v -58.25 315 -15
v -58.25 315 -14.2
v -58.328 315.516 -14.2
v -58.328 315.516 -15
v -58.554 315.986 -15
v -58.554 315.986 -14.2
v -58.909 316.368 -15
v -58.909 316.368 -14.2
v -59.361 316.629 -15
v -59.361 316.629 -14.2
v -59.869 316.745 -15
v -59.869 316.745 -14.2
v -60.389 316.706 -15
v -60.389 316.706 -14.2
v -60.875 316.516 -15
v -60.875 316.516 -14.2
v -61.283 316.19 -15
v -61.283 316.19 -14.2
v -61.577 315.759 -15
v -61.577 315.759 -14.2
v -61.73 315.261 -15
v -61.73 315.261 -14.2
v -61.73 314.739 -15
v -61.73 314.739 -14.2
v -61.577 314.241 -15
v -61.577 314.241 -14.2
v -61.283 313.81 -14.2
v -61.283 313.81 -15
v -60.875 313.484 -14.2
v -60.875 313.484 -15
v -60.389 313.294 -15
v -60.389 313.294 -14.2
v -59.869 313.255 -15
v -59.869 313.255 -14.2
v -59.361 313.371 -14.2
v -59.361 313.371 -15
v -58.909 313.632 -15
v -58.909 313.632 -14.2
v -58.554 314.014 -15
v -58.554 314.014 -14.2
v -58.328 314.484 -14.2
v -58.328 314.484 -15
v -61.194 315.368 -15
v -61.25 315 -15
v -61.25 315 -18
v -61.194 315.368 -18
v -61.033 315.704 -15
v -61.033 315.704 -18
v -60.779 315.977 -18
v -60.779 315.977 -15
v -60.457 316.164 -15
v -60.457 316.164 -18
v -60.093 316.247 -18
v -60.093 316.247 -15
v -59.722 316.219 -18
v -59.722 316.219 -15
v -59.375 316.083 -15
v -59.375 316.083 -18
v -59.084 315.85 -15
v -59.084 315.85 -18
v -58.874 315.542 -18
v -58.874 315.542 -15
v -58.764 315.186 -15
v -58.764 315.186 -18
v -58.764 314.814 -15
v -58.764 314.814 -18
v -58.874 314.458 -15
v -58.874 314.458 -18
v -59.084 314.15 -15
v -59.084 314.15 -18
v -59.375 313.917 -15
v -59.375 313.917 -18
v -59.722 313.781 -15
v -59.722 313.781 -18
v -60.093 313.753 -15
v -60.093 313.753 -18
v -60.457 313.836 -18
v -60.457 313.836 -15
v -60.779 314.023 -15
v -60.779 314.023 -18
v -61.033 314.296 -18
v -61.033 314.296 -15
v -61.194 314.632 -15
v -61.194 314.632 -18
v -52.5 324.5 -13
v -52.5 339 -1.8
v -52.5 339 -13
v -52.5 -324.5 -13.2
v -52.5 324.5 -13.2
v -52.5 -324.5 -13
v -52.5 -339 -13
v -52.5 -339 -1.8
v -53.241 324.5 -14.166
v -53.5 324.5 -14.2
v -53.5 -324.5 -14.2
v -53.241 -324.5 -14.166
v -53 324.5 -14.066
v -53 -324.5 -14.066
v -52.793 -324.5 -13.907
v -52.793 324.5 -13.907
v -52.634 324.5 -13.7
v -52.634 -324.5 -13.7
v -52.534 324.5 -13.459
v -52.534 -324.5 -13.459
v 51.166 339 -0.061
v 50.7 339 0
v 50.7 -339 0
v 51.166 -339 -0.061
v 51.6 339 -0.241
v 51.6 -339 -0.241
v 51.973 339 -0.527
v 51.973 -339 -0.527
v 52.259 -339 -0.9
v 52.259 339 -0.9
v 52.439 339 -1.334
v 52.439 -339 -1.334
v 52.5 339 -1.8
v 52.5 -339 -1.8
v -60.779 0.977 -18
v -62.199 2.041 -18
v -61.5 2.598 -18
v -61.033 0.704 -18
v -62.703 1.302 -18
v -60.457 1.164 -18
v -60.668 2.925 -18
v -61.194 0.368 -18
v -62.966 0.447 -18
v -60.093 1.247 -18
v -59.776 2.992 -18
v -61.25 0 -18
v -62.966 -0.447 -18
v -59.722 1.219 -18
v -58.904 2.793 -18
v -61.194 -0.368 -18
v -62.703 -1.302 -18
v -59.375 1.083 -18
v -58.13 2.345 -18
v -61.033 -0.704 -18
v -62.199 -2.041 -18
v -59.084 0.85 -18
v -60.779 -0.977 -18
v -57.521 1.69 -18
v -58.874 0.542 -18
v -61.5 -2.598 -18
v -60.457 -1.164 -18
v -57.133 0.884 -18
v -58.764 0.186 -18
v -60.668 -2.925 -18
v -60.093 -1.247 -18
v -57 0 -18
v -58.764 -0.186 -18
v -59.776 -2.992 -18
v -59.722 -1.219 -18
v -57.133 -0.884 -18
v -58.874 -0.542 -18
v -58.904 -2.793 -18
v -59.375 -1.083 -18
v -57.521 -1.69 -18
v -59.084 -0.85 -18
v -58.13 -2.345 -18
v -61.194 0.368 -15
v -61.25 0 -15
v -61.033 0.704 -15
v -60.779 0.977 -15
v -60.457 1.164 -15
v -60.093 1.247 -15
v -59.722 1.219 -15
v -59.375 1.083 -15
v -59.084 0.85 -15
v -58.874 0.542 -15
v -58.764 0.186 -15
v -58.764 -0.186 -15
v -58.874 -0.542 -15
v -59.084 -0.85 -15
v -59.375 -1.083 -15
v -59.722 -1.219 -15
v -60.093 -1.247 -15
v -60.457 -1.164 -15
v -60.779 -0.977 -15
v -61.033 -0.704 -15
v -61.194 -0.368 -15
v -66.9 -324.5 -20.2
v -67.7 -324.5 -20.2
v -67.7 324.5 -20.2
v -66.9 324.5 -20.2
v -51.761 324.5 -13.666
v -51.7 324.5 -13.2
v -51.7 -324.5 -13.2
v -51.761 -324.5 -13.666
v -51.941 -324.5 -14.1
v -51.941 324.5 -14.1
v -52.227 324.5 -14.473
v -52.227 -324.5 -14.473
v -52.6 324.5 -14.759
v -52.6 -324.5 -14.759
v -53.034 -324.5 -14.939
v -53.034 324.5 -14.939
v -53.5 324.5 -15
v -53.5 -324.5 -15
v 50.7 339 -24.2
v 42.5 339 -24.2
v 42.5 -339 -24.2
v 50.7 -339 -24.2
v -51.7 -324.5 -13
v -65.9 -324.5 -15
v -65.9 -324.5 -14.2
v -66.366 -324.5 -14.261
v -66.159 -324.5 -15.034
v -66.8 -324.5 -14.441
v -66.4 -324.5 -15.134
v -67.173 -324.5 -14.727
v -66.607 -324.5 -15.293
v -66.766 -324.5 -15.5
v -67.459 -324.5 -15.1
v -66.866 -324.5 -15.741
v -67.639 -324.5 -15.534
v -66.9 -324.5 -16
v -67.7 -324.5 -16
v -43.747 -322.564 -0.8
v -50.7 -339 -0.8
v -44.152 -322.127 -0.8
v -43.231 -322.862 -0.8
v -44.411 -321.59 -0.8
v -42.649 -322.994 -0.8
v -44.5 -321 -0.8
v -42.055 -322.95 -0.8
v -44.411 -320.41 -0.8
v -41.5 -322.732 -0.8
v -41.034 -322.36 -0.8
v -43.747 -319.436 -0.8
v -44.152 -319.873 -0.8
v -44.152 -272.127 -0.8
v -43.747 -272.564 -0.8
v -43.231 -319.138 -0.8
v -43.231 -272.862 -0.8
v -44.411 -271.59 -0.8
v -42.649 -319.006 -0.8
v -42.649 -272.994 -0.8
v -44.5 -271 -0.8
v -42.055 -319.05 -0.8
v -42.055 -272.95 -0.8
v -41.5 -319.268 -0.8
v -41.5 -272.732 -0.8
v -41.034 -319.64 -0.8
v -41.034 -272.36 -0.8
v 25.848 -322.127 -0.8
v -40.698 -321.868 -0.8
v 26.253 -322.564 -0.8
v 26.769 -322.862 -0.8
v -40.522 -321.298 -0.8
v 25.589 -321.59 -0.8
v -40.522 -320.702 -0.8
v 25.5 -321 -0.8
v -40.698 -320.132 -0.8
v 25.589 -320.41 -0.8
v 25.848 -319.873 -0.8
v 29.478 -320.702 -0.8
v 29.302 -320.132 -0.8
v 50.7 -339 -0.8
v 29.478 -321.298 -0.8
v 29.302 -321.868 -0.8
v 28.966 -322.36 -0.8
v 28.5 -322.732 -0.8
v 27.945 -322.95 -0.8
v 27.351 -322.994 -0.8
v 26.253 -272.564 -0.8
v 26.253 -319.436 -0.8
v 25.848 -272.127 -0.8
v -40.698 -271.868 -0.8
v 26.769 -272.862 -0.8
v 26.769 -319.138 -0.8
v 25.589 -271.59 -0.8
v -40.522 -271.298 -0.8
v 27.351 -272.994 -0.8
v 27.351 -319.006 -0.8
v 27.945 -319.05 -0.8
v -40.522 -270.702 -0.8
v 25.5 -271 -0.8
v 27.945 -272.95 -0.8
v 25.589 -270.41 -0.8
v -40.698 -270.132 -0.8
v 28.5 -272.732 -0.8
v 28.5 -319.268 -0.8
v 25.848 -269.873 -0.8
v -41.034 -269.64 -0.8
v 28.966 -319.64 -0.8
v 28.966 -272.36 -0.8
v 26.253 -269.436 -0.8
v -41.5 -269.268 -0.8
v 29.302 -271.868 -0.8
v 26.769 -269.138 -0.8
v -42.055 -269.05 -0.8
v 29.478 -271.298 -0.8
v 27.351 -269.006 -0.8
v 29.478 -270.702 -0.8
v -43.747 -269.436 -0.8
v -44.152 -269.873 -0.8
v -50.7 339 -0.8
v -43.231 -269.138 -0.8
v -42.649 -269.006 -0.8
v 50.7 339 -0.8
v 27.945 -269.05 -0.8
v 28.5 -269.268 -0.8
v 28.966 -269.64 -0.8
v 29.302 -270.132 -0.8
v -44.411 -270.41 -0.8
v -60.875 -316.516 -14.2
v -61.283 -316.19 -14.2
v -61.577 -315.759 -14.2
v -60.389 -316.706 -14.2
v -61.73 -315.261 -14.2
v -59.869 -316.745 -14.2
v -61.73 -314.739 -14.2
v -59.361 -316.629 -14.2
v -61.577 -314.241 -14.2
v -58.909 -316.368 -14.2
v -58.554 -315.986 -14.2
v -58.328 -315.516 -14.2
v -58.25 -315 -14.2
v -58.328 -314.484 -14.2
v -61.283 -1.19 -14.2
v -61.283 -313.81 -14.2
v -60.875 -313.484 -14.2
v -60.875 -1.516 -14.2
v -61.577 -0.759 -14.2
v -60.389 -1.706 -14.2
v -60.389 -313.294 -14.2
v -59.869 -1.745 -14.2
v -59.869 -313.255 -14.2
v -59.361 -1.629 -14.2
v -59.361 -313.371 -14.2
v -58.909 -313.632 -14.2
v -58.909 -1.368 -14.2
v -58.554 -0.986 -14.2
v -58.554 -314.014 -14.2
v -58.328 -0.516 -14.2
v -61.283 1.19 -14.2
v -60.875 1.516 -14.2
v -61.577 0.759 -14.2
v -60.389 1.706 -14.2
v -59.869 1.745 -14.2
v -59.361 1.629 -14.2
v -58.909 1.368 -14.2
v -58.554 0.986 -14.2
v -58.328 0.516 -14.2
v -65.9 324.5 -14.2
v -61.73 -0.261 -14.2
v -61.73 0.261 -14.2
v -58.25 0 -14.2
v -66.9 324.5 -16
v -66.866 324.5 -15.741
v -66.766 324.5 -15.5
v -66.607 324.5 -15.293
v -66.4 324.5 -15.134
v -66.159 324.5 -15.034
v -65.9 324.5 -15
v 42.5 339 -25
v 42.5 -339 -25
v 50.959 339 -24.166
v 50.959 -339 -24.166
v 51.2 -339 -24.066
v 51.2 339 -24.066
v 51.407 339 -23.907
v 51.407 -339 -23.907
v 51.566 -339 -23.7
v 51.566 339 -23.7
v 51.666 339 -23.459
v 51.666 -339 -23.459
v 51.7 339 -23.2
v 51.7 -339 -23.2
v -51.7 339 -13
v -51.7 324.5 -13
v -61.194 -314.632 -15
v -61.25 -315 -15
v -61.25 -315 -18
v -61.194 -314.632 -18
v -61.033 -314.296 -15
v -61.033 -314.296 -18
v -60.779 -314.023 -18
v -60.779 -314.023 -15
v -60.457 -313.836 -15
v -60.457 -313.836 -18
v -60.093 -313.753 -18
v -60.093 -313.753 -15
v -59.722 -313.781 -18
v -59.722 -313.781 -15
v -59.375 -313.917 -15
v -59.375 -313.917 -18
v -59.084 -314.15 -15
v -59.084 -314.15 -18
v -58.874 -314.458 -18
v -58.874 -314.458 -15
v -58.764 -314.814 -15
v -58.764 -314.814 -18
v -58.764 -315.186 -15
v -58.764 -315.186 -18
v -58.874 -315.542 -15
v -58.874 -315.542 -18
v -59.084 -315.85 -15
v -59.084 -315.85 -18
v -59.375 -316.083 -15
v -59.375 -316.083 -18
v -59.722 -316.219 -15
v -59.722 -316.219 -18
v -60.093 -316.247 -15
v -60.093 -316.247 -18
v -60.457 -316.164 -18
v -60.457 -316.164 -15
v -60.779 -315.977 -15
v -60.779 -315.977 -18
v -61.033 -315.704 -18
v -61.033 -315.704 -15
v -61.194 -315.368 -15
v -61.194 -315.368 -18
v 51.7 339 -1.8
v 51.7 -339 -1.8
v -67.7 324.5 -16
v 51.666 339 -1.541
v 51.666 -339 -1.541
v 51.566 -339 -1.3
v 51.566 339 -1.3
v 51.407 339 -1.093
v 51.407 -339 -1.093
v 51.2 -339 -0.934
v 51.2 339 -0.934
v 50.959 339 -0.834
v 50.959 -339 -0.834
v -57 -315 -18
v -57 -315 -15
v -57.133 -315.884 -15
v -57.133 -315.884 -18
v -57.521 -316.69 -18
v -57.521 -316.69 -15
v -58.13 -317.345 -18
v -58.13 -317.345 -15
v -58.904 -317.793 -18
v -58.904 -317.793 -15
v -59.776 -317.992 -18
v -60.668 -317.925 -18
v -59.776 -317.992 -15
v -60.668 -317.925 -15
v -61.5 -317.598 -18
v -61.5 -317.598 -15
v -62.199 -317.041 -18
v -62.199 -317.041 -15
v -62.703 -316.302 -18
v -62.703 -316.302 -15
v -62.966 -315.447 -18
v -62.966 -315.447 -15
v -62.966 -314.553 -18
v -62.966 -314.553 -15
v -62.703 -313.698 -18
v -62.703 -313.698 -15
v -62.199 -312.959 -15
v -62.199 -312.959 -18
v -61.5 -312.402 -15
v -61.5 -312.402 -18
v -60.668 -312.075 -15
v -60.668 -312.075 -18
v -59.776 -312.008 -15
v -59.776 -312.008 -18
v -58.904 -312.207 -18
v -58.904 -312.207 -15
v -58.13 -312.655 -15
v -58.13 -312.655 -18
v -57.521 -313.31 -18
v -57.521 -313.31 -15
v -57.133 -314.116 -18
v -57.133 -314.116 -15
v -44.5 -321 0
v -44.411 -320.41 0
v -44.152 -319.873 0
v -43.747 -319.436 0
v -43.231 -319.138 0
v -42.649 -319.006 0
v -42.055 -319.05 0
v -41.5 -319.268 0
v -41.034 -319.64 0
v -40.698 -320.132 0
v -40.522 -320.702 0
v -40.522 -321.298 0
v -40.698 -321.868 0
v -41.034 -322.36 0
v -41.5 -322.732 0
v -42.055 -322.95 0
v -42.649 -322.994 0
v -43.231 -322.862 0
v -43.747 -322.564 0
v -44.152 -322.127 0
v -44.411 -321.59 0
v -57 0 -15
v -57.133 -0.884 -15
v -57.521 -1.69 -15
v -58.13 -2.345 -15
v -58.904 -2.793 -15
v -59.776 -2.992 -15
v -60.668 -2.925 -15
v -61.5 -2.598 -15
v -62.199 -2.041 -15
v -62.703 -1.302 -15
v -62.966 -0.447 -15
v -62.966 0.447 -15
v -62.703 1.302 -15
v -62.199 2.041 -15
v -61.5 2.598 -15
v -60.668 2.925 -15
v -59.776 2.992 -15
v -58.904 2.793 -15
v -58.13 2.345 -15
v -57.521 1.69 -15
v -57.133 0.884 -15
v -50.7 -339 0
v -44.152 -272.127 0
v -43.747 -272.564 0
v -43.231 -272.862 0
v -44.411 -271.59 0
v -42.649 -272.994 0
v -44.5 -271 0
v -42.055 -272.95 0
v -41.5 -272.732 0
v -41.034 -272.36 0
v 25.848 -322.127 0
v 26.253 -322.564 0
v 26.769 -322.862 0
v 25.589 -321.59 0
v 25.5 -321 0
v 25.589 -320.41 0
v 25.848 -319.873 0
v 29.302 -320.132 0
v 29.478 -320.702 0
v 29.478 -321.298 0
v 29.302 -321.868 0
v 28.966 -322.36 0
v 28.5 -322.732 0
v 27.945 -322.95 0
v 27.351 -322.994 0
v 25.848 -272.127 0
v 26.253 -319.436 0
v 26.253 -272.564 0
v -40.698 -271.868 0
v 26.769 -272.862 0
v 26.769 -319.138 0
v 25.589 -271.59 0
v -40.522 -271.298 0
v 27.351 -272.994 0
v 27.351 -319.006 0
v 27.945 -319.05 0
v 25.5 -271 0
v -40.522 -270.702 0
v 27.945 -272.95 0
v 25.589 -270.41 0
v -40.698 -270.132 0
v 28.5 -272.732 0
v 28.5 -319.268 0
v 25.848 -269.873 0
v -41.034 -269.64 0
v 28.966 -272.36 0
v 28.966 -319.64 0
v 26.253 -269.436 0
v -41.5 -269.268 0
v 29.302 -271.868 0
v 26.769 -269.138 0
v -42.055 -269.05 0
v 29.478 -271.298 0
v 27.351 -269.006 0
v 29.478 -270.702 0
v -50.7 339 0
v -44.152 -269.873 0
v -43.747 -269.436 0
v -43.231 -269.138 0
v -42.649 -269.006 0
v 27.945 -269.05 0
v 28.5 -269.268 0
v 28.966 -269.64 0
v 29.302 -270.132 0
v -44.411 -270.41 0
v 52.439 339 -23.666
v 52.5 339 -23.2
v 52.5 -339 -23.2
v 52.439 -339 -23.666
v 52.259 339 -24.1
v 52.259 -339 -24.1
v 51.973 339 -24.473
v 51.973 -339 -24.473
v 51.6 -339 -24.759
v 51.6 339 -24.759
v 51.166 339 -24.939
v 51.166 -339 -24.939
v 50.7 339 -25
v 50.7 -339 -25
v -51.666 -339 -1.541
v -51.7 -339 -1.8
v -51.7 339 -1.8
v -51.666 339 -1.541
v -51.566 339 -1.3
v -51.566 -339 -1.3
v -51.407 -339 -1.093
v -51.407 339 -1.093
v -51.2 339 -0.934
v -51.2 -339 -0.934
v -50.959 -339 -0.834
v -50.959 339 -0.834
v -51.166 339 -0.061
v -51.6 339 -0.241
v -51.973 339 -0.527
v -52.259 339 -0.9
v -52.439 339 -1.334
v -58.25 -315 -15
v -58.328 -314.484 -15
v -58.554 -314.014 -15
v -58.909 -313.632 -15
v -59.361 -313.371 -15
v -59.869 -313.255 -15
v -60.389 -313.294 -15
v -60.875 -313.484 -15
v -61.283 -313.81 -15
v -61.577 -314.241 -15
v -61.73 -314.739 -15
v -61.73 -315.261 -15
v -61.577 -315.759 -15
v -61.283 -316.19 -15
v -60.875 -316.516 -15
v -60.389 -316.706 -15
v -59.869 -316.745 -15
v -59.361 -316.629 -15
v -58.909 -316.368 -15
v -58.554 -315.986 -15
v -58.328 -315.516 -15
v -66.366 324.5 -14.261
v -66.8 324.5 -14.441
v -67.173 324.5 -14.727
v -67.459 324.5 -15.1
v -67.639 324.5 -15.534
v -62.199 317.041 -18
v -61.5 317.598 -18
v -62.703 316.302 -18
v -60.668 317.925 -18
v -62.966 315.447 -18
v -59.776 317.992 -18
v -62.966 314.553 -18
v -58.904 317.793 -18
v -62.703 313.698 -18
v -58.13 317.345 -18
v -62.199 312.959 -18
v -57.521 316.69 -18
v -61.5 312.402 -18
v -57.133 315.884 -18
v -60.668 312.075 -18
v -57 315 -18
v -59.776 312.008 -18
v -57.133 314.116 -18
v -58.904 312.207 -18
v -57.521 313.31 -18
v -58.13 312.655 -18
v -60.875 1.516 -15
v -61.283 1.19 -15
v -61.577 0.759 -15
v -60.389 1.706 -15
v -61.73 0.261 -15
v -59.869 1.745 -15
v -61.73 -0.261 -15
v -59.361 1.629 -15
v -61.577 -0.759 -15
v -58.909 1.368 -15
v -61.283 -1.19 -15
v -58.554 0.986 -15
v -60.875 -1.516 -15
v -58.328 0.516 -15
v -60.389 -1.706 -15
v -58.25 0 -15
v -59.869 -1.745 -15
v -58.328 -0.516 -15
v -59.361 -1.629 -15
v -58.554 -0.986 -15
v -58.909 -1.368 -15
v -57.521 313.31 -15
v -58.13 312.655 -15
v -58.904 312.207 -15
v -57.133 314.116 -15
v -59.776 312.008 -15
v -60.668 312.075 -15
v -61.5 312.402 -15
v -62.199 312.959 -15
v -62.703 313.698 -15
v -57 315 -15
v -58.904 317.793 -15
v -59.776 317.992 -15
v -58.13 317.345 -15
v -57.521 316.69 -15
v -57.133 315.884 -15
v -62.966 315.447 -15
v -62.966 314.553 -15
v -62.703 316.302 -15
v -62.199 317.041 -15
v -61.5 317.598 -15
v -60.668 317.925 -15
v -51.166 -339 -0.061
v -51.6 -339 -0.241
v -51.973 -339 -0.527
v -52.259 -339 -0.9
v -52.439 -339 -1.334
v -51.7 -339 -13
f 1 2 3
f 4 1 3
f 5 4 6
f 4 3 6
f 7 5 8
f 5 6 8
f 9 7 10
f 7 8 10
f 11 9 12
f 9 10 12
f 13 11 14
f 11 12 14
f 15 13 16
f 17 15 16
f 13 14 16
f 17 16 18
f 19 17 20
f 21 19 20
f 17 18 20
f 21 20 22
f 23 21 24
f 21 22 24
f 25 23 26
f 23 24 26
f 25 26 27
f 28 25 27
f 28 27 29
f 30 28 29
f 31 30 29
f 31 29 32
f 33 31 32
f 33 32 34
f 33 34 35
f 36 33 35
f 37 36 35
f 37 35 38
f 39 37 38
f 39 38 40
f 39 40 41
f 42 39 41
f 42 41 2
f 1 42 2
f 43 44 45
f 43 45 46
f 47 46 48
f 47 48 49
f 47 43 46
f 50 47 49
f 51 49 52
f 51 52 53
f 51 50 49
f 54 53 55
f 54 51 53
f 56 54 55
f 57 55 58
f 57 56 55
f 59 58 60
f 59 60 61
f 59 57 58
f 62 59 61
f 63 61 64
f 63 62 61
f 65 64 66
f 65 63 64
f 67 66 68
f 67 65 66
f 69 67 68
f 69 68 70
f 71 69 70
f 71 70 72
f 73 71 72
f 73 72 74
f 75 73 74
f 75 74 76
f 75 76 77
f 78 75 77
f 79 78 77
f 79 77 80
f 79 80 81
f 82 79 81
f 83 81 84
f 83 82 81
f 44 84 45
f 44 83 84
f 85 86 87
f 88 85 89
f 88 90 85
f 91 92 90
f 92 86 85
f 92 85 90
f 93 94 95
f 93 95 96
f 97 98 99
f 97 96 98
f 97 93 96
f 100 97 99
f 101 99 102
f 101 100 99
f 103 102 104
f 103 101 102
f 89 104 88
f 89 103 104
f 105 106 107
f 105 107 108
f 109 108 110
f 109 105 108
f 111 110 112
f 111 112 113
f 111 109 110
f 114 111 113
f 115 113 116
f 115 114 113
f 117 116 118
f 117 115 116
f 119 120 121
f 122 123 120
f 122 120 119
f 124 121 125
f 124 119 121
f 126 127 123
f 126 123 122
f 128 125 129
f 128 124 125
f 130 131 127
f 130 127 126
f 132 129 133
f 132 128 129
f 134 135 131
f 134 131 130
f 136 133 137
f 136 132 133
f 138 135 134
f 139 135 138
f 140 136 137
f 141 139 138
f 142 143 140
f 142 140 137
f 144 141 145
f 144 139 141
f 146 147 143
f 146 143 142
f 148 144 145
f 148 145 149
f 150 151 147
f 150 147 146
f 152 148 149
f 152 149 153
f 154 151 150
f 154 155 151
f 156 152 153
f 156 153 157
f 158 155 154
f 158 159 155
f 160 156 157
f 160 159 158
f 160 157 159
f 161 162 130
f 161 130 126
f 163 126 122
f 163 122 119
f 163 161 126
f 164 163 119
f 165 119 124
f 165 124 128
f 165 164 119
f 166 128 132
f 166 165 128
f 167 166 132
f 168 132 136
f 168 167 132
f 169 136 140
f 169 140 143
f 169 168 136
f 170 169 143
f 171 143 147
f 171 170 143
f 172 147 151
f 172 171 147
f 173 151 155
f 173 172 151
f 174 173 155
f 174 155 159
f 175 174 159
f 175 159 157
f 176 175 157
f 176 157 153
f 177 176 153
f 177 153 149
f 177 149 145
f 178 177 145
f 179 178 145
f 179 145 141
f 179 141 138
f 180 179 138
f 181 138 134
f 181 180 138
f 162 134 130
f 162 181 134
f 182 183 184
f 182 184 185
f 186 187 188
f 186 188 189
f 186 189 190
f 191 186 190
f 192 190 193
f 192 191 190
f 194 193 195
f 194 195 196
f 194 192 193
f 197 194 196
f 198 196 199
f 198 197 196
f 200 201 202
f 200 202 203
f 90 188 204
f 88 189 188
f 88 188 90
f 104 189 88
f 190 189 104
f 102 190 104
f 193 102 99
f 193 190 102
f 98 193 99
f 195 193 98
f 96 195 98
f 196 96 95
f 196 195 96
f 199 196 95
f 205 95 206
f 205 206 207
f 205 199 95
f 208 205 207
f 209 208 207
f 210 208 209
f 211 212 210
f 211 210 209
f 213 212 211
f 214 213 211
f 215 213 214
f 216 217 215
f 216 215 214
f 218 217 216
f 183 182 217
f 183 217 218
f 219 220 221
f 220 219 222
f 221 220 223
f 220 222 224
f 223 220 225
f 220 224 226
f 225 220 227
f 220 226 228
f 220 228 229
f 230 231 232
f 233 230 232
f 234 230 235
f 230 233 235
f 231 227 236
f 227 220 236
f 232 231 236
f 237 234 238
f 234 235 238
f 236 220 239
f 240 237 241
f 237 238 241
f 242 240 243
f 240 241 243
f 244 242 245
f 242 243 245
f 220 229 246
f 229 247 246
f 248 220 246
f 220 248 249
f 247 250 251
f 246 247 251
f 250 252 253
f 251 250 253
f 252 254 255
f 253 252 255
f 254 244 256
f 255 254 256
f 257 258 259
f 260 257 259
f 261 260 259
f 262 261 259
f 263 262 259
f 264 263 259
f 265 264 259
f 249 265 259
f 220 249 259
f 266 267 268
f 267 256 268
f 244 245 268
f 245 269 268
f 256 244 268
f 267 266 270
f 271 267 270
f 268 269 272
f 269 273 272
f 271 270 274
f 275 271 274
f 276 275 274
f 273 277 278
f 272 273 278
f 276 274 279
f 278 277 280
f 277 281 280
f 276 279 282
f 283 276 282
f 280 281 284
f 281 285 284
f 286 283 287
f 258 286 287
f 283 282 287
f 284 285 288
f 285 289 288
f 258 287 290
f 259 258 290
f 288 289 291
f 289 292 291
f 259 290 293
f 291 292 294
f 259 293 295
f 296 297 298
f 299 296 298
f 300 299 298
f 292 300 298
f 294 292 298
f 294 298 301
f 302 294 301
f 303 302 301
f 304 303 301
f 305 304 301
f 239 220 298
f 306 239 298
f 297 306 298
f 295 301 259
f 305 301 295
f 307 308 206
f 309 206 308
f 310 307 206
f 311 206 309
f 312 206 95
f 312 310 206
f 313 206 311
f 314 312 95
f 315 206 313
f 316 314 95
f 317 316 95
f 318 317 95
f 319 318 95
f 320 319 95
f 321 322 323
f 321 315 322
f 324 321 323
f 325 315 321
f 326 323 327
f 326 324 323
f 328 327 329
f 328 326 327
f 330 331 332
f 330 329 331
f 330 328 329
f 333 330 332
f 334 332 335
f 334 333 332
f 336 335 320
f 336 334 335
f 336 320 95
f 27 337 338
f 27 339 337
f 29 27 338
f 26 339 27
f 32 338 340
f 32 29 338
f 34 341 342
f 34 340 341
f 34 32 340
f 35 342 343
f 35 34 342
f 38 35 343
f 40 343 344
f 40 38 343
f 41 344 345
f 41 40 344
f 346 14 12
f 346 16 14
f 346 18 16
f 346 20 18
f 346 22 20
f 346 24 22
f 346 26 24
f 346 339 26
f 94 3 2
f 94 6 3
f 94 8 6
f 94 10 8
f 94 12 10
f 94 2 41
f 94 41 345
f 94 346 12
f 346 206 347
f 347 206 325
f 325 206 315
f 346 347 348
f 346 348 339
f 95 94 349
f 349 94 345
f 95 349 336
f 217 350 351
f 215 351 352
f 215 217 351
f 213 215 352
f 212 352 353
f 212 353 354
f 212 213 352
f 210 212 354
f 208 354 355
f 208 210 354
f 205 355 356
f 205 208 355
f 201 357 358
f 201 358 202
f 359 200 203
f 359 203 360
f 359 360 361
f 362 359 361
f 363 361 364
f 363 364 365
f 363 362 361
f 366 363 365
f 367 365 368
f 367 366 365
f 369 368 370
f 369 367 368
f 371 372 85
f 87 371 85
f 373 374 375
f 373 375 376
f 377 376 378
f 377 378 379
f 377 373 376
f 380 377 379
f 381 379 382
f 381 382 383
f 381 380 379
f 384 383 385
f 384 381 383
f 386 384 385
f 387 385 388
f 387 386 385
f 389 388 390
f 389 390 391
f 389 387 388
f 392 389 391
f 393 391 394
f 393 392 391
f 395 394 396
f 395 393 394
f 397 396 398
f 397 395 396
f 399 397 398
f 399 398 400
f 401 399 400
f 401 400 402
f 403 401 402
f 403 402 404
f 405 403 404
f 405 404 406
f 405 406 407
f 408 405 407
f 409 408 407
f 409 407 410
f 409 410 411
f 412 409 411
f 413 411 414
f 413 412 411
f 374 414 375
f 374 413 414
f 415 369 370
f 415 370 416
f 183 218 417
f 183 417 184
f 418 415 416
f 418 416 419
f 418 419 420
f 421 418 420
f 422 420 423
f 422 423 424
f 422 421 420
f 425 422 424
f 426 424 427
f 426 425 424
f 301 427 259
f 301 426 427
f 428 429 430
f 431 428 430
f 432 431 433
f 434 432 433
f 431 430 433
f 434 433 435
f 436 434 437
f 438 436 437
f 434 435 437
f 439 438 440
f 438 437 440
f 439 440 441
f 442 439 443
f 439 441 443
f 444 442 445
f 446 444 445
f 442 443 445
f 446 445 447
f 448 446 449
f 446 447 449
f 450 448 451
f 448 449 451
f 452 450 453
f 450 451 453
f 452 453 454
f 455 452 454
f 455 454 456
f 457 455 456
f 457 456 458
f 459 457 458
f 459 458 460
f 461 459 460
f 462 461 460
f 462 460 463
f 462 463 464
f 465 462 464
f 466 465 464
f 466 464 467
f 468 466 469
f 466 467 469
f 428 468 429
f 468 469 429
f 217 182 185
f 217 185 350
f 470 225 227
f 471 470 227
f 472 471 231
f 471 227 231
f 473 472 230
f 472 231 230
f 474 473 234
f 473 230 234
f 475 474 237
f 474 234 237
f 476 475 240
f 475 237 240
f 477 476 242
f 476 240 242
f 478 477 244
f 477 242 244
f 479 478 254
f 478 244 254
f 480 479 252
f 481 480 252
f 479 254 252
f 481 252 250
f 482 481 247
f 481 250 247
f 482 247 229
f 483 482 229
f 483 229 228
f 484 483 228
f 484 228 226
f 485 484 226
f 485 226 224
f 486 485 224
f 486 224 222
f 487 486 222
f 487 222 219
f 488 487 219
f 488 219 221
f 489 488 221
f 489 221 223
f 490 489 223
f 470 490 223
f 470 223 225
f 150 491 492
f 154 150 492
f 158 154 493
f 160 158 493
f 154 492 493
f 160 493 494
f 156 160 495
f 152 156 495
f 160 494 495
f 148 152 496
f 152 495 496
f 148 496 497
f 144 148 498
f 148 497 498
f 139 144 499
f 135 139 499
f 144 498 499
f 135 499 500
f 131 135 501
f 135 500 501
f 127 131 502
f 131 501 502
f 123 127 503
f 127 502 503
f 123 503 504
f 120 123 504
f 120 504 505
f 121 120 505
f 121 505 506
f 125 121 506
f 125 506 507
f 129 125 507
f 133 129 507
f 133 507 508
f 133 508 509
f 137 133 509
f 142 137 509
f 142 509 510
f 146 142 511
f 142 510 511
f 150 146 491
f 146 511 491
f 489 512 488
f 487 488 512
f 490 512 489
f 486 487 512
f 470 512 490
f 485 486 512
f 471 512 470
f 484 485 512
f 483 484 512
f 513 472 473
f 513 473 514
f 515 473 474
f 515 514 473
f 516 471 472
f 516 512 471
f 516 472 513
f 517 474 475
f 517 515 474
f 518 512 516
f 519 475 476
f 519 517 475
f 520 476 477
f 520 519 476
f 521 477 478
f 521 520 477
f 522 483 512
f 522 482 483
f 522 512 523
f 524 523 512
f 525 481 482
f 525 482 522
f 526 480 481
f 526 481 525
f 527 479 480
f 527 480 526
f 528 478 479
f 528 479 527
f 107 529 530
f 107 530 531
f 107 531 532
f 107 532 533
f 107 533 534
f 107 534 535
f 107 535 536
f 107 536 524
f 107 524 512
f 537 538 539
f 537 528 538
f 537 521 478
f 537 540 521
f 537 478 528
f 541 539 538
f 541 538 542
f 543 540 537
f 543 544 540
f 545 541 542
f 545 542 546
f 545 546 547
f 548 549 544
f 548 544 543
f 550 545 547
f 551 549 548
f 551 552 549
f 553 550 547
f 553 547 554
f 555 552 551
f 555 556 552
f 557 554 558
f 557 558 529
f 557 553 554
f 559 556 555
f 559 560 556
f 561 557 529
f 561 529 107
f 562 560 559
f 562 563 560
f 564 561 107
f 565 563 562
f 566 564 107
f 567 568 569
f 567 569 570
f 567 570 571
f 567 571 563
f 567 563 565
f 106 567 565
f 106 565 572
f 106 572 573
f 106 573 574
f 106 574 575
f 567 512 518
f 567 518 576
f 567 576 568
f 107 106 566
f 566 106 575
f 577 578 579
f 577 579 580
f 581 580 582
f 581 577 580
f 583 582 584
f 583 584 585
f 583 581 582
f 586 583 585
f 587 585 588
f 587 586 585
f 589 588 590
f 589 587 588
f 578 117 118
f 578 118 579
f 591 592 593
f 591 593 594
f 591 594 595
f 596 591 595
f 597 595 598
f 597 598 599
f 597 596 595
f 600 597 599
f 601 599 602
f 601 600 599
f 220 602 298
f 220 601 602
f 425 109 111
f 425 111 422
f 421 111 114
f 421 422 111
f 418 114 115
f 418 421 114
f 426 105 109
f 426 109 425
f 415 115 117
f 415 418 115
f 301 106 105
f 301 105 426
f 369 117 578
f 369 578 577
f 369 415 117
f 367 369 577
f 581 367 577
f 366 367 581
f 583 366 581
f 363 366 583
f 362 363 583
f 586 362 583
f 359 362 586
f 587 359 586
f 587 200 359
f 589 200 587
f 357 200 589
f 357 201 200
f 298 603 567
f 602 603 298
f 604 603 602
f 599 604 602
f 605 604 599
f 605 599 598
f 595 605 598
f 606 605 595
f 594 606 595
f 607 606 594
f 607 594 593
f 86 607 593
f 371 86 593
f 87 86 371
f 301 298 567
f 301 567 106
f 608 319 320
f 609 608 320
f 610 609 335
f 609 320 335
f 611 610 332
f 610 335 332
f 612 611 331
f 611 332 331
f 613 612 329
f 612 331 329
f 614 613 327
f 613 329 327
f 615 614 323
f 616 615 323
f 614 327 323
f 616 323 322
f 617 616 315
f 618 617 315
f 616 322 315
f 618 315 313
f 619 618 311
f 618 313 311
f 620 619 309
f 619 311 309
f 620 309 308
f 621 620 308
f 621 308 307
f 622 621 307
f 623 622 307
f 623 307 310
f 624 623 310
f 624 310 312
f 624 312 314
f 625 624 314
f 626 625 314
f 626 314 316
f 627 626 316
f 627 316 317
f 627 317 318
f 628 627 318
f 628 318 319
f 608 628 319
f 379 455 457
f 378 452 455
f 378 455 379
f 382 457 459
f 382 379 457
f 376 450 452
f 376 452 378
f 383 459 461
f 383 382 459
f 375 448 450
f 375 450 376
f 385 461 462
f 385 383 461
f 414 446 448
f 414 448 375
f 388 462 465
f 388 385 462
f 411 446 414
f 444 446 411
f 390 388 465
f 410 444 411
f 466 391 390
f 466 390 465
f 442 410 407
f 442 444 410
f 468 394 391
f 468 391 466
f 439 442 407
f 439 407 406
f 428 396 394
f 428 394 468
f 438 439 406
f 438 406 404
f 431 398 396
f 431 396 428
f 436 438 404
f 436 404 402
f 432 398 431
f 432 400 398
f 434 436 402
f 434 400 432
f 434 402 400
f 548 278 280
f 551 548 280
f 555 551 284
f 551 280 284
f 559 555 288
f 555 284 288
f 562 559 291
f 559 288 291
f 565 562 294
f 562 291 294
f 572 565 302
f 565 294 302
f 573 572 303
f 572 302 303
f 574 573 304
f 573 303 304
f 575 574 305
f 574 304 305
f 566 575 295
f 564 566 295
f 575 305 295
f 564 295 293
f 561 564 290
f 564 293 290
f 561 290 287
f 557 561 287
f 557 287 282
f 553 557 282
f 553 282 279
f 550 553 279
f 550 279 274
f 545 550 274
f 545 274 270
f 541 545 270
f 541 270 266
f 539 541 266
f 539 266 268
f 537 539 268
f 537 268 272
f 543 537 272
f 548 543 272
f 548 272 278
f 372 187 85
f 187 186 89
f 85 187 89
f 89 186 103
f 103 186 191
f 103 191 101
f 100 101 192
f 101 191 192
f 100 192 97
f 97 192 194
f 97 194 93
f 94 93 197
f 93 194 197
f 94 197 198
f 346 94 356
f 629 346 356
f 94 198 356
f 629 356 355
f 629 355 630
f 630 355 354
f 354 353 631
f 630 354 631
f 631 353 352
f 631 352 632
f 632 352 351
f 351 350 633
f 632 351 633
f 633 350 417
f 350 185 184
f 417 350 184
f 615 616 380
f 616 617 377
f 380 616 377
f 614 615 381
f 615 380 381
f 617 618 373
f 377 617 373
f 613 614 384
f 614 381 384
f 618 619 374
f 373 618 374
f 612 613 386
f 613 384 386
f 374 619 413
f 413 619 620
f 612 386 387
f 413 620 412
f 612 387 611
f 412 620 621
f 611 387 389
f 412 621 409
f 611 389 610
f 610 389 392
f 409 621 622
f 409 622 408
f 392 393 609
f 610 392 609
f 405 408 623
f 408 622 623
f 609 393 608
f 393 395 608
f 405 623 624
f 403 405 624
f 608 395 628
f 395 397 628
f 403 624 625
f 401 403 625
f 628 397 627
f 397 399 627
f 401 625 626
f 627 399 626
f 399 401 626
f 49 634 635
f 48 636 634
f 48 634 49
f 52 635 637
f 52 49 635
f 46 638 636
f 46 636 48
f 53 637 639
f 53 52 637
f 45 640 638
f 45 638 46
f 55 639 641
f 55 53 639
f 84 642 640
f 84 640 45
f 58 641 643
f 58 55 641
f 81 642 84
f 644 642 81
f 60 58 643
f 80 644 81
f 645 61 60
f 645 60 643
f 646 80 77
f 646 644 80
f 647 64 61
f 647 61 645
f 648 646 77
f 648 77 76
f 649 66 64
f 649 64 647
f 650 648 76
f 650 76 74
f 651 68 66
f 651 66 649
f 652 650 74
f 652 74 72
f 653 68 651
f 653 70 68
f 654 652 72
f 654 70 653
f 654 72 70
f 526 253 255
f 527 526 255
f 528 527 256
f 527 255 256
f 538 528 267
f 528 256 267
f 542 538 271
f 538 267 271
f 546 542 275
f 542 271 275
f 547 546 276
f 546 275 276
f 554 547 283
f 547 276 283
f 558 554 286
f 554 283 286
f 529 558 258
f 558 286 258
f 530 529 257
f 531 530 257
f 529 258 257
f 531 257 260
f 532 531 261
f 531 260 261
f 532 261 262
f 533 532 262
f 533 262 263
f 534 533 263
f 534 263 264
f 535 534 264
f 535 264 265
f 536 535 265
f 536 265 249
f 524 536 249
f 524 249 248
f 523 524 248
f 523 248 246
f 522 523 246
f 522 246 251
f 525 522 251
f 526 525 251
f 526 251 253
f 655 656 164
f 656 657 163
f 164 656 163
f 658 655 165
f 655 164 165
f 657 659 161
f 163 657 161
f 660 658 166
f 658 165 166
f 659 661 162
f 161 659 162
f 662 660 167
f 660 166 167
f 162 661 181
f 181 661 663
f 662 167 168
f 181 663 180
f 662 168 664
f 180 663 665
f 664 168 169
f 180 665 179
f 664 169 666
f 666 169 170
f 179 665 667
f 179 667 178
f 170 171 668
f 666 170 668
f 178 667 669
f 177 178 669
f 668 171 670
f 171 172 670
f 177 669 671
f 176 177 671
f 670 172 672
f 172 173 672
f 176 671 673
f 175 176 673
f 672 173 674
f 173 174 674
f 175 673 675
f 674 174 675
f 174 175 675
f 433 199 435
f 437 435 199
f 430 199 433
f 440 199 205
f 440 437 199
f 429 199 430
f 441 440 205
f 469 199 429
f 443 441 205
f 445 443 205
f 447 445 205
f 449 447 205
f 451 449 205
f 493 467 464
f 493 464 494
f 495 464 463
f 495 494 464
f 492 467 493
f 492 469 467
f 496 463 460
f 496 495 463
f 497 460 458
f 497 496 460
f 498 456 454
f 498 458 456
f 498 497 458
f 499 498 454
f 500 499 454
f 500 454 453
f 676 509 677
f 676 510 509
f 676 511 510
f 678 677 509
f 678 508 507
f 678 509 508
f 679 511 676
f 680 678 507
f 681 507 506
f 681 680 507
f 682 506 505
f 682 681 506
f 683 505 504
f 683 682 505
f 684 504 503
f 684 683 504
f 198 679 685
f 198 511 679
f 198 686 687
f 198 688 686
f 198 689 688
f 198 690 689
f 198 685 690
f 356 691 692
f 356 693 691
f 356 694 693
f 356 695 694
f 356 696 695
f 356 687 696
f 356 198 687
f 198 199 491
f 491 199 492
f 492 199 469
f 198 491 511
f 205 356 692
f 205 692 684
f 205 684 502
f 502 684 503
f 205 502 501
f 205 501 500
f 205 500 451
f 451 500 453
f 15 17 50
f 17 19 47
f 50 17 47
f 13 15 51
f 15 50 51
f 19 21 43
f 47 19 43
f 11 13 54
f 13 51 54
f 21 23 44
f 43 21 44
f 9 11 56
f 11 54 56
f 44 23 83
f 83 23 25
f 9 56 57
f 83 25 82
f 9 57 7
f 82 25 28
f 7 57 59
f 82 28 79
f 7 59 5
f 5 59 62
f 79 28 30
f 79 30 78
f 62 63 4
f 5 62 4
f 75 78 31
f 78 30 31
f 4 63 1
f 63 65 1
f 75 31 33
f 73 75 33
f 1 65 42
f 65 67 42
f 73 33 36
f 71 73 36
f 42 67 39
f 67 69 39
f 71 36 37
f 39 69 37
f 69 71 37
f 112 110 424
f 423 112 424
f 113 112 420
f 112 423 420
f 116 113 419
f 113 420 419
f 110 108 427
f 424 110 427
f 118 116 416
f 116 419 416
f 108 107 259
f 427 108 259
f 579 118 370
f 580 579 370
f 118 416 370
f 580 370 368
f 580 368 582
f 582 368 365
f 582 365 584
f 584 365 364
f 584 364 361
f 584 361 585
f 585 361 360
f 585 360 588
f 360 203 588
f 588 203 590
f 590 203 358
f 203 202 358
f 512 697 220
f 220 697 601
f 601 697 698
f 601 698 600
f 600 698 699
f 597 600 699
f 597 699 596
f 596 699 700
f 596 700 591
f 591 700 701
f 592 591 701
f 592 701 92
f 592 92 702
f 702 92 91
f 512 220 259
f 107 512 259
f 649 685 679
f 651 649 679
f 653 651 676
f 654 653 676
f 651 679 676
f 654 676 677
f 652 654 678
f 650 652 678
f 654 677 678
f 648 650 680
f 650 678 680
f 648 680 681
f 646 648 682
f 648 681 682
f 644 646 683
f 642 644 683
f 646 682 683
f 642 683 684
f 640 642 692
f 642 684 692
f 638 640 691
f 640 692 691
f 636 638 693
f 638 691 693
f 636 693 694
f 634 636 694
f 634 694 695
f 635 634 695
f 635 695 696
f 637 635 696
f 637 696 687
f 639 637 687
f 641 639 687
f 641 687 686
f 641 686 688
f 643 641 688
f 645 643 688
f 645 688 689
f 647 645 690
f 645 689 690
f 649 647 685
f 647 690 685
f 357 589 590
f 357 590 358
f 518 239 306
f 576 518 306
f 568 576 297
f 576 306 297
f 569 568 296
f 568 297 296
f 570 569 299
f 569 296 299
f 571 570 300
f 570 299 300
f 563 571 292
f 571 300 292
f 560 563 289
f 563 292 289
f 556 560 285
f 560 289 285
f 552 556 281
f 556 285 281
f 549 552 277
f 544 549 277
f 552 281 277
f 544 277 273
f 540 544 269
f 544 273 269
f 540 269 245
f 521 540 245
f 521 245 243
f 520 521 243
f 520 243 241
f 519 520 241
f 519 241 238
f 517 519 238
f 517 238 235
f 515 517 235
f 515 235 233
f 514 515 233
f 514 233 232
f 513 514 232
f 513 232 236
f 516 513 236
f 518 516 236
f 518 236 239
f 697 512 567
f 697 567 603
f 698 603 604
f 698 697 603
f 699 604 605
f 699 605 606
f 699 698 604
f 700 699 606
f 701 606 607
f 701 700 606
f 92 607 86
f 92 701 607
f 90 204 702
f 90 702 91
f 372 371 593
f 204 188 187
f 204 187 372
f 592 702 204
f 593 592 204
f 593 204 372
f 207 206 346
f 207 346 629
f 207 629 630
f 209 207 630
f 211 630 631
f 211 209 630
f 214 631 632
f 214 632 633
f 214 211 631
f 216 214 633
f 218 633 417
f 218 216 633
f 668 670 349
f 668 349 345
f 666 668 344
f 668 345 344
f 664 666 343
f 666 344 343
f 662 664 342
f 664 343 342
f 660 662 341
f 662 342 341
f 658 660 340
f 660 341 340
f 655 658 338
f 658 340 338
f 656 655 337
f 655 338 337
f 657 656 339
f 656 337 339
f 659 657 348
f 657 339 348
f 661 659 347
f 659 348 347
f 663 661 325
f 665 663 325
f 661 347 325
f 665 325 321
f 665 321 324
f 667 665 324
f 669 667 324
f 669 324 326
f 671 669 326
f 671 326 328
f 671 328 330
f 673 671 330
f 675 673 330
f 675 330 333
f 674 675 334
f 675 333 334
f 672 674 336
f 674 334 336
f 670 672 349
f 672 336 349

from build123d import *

# Parameters (mm, degrees)
SKETCH_15_W                      = 105
SKETCH_15_H                      = 678
SM_BASE_FLANGE_1_DEPTH           = 0.8
SM_EDGE_FLANGE_1_STRIP_W         = 5.2
SM_EDGE_FLANGE_1_STRIP_H         = 0.8
SM_EDGE_FLANGE_1_STRIP_CUT_DEPTH = 678
SM_EDGE_FLANGE_1_DEPTH           = 678
SM_EDGE_FLANGE_2_STRIP_W         = 5.2
SM_EDGE_FLANGE_2_STRIP_H         = 0.8
SM_EDGE_FLANGE_2_STRIP_CUT_DEPTH = 678
SM_EDGE_FLANGE_2_DEPTH           = 678
SM_EDGE_FLANGE_3_STRIP_W         = 5.2
SM_EDGE_FLANGE_3_STRIP_H         = 0.8
SM_EDGE_FLANGE_3_STRIP_CUT_DEPTH = 678
SM_EDGE_FLANGE_3_DEPTH           = 678
SM_EDGE_FLANGE_4_STRIP_W         = 5.2
SM_EDGE_FLANGE_4_STRIP_H         = 0.8
SM_EDGE_FLANGE_4_STRIP_CUT_DEPTH = 678
SM_EDGE_FLANGE_4_DEPTH           = 678
SKETCH_31_W                      = 16
SKETCH_31_H                      = 14.5
CUT_EXTRUDE_1_DEPTH              = 2
SM_EDGE_FLANGE_5_STRIP_W         = 5.2
SM_EDGE_FLANGE_5_STRIP_H         = 0.8
SM_EDGE_FLANGE_5_STRIP_CUT_DEPTH = 649
SM_EDGE_FLANGE_5_DEPTH           = 649
SKETCH_35_R                      = 1.75
CUT_EXTRUDE_2_DEPTH              = 10
SKETCH_36_R                      = 3
SKETCH_36_R_2                    = 1.25
EXTRUDE_1_DEPTH                  = 3
PATTERN_LINEAR_1_COUNT           = 2
PATTERN_LINEAR_1_PITCH           = 315
PATTERN_LINEAR_1_COUNT_DIR2      = 2
PATTERN_LINEAR_1_PITCH_DIR2      = 315
HOLE_WIZARD_4_0_4_1_D            = 4
HOLE_WIZARD_4_0_4_1_DEPTH        = 5.2
HOLE_WIZARD_4_0_4_1_TIP          = 1.201721238


# Sheet-metal steps are written as plain solids
with BuildPart() as part:
    # 草图15 → 基体-法兰1 (new body)
    with BuildSketch(Plane.XY):
        Rectangle(SKETCH_15_W, SKETCH_15_H)
    extrude(amount=-SM_BASE_FLANGE_1_DEPTH)

    # 边线-法兰1 strip (across the edge) → 边线-法兰1 strip cut (cut)
    with BuildSketch(Plane(origin=(52.5, 339, -0.8), x_dir=(-1, 0, 0), z_dir=(0, -1, 0))):
        with Locations((-0.8, -0.4)):
            Rectangle(SM_EDGE_FLANGE_1_STRIP_W, SM_EDGE_FLANGE_1_STRIP_H)
    extrude(amount=SM_EDGE_FLANGE_1_STRIP_CUT_DEPTH, mode=Mode.SUBTRACT)

    # 边线-法兰1 section (across the edge) → 边线-法兰1 (add)
    with BuildSketch(Plane(origin=(52.5, 339, -0.8), x_dir=(-1, 0, 0), z_dir=(0, -1, 0))):
        with BuildLine():
            Line((0, 1), (0, 24.2))
            Line((0, 24.2), (0.8, 24.2))
            Line((0.8, 24.2), (0.8, 1))
            ThreePointArc((0.8, 1), (1.092893219, 0.292893219), (1.8, 0))
            Line((1.8, 0), (1.8, -0.8))
            ThreePointArc((1.8, -0.8), (0.527207794, -0.272792206), (0, 1))
        make_face()
    extrude(amount=SM_EDGE_FLANGE_1_DEPTH)

    # 边线-法兰2 strip (across the edge) → 边线-法兰2 strip cut (cut)
    with BuildSketch(Plane(origin=(51.7, 339, -25), x_dir=(0, 0, 1), z_dir=(0, -1, 0))):
        with Locations((-0.8, -0.4)):
            Rectangle(SM_EDGE_FLANGE_2_STRIP_W, SM_EDGE_FLANGE_2_STRIP_H)
    extrude(amount=SM_EDGE_FLANGE_2_STRIP_CUT_DEPTH, mode=Mode.SUBTRACT)

    # 边线-法兰2 section (across the edge) → 边线-法兰2 (add)
    with BuildSketch(Plane(origin=(51.7, 339, -25), x_dir=(0, 0, 1), z_dir=(0, -1, 0))):
        with BuildLine():
            Line((0, 1), (0, 9.2))
            Line((0, 9.2), (0.8, 9.2))
            Line((0.8, 9.2), (0.8, 1))
            ThreePointArc((0.8, 1), (1.092893219, 0.292893219), (1.8, 0))
            Line((1.8, 0), (1.8, -0.8))
            ThreePointArc((1.8, -0.8), (0.527207794, -0.272792206), (0, 1))
        make_face()
    extrude(amount=SM_EDGE_FLANGE_2_DEPTH)

    # 边线-法兰3 strip (across the edge) → 边线-法兰3 strip cut (cut)
    with BuildSketch(Plane(origin=(-52.5, -339, -0.8), x_dir=(1, 0, 0), z_dir=(0, 1, 0))):
        with Locations((-0.8, -0.4)):
            Rectangle(SM_EDGE_FLANGE_3_STRIP_W, SM_EDGE_FLANGE_3_STRIP_H)
    extrude(amount=SM_EDGE_FLANGE_3_STRIP_CUT_DEPTH, mode=Mode.SUBTRACT)

    # 边线-法兰3 section (across the edge) → 边线-法兰3 (add)
    with BuildSketch(Plane(origin=(-52.5, -339, -0.8), x_dir=(1, 0, 0), z_dir=(0, 1, 0))):
        with BuildLine():
            Line((0, 1), (0, 14.2))
            Line((0, 14.2), (0.8, 14.2))
            Line((0.8, 14.2), (0.8, 1))
            ThreePointArc((0.8, 1), (1.092893219, 0.292893219), (1.8, 0))
            Line((1.8, 0), (1.8, -0.8))
            ThreePointArc((1.8, -0.8), (0.527207794, -0.272792206), (0, 1))
        make_face()
    extrude(amount=SM_EDGE_FLANGE_3_DEPTH)

    # 边线-法兰4 strip (across the edge) → 边线-法兰4 strip cut (cut)
    with BuildSketch(Plane(origin=(-52.5, 339, -15), x_dir=(0, 0, 1), z_dir=(0, -1, 0))):
        with Locations((-0.8, -0.4)):
            Rectangle(SM_EDGE_FLANGE_4_STRIP_W, SM_EDGE_FLANGE_4_STRIP_H)
    extrude(amount=SM_EDGE_FLANGE_4_STRIP_CUT_DEPTH, mode=Mode.SUBTRACT)

    # 边线-法兰4 section (across the edge) → 边线-法兰4 (add)
    with BuildSketch(Plane(origin=(-52.5, 339, -15), x_dir=(0, 0, 1), z_dir=(0, -1, 0))):
        with BuildLine():
            Line((0, 1), (0, 15.2))
            Line((0, 15.2), (0.8, 15.2))
            Line((0.8, 15.2), (0.8, 1))
            ThreePointArc((0.8, 1), (1.092893219, 0.292893219), (1.8, 0))
            Line((1.8, 0), (1.8, -0.8))
            ThreePointArc((1.8, -0.8), (0.527207794, -0.272792206), (0, 1))
        make_face()
    extrude(amount=SM_EDGE_FLANGE_4_DEPTH)

    # 草图31 → 切除-拉伸1 (cut)
    with BuildSketch(Plane(origin=(0, 0, -15), x_dir=(-1, 0, 0), z_dir=(0, 0, -1))):
        with Locations((59.7, -331.75)):
            Rectangle(SKETCH_31_W, SKETCH_31_H)
    cut_extrude_1 = extrude(amount=-CUT_EXTRUDE_1_DEPTH, mode=Mode.SUBTRACT)

    # 镜向1: 切除-拉伸1 across plane
    add(cut_extrude_1.mirror(Plane.ZX), mode=Mode.SUBTRACT)

    # 边线-法兰5 strip (across the edge) → 边线-法兰5 strip cut (cut)
    with BuildSketch(Plane(origin=(-67.7, -324.5, -15), x_dir=(1, 0, 0), z_dir=(0, 1, 0))):
        with Locations((-0.8, -0.4)):
            Rectangle(SM_EDGE_FLANGE_5_STRIP_W, SM_EDGE_FLANGE_5_STRIP_H)
    extrude(amount=SM_EDGE_FLANGE_5_STRIP_CUT_DEPTH, mode=Mode.SUBTRACT)

    # 边线-法兰5 section (across the edge) → 边线-法兰5 (add)
    with BuildSketch(Plane(origin=(-67.7, -324.5, -15), x_dir=(1, 0, 0), z_dir=(0, 1, 0))):
        with BuildLine():
            Line((0, 1), (0, 5.2))
            Line((0, 5.2), (0.8, 5.2))
            Line((0.8, 5.2), (0.8, 1))
            ThreePointArc((0.8, 1), (1.092893219, 0.292893219), (1.8, 0))
            Line((1.8, 0), (1.8, -0.8))
            ThreePointArc((1.8, -0.8), (0.527207794, -0.272792206), (0, 1))
        make_face()
    extrude(amount=SM_EDGE_FLANGE_5_DEPTH)

    # 草图35 → 切除-拉伸2 (cut)
    with BuildSketch(Plane.XY.offset(-14.2)):
        with Locations((-60, 0)):
            Circle(SKETCH_35_R)
    cut_extrude_2 = extrude(amount=-CUT_EXTRUDE_2_DEPTH, mode=Mode.SUBTRACT)

    # 草图36 → 凸台-拉伸1 (add)
    with BuildSketch(Plane(origin=(0, 0, -15), x_dir=(-1, 0, 0), z_dir=(0, 0, -1))):
        with Locations(Location((60, 0, 0), (0, 0, 180))):
            Circle(SKETCH_36_R)
        with Locations((60, 0)):
            Circle(SKETCH_36_R_2, mode=Mode.SUBTRACT)
    extrude_1 = extrude(amount=EXTRUDE_1_DEPTH)

    # 阵列(线性)1: 切除-拉伸2, Extrude 1 2 × 2
    with Locations(*[Vector(0, -1, 0) * (i * PATTERN_LINEAR_1_PITCH) + Vector(0, 1, 0) * (j * PATTERN_LINEAR_1_PITCH_DIR2) for i in range(PATTERN_LINEAR_1_COUNT) for j in range(PATTERN_LINEAR_1_COUNT_DIR2) if (i, j) != (0, 0)]):
        add(cut_extrude_2, mode=Mode.SUBTRACT)
        add(extrude_1)

    # Ø4.0 (4) 直径孔1
    with Locations(Plane.XY):
        with Locations((-42.5, -271), (-42.5, -321), (27.5, -321), (27.5, -271)):
            Hole(HOLE_WIZARD_4_0_4_1_D / 2, depth=HOLE_WIZARD_4_0_4_1_DEPTH)
            with Locations((0, 0, -(HOLE_WIZARD_4_0_4_1_DEPTH + HOLE_WIZARD_4_0_4_1_TIP / 2))):  # 118° drill point
                Cone(0, HOLE_WIZARD_4_0_4_1_D / 2, HOLE_WIZARD_4_0_4_1_TIP, mode=Mode.SUBTRACT)


solid = part.part
